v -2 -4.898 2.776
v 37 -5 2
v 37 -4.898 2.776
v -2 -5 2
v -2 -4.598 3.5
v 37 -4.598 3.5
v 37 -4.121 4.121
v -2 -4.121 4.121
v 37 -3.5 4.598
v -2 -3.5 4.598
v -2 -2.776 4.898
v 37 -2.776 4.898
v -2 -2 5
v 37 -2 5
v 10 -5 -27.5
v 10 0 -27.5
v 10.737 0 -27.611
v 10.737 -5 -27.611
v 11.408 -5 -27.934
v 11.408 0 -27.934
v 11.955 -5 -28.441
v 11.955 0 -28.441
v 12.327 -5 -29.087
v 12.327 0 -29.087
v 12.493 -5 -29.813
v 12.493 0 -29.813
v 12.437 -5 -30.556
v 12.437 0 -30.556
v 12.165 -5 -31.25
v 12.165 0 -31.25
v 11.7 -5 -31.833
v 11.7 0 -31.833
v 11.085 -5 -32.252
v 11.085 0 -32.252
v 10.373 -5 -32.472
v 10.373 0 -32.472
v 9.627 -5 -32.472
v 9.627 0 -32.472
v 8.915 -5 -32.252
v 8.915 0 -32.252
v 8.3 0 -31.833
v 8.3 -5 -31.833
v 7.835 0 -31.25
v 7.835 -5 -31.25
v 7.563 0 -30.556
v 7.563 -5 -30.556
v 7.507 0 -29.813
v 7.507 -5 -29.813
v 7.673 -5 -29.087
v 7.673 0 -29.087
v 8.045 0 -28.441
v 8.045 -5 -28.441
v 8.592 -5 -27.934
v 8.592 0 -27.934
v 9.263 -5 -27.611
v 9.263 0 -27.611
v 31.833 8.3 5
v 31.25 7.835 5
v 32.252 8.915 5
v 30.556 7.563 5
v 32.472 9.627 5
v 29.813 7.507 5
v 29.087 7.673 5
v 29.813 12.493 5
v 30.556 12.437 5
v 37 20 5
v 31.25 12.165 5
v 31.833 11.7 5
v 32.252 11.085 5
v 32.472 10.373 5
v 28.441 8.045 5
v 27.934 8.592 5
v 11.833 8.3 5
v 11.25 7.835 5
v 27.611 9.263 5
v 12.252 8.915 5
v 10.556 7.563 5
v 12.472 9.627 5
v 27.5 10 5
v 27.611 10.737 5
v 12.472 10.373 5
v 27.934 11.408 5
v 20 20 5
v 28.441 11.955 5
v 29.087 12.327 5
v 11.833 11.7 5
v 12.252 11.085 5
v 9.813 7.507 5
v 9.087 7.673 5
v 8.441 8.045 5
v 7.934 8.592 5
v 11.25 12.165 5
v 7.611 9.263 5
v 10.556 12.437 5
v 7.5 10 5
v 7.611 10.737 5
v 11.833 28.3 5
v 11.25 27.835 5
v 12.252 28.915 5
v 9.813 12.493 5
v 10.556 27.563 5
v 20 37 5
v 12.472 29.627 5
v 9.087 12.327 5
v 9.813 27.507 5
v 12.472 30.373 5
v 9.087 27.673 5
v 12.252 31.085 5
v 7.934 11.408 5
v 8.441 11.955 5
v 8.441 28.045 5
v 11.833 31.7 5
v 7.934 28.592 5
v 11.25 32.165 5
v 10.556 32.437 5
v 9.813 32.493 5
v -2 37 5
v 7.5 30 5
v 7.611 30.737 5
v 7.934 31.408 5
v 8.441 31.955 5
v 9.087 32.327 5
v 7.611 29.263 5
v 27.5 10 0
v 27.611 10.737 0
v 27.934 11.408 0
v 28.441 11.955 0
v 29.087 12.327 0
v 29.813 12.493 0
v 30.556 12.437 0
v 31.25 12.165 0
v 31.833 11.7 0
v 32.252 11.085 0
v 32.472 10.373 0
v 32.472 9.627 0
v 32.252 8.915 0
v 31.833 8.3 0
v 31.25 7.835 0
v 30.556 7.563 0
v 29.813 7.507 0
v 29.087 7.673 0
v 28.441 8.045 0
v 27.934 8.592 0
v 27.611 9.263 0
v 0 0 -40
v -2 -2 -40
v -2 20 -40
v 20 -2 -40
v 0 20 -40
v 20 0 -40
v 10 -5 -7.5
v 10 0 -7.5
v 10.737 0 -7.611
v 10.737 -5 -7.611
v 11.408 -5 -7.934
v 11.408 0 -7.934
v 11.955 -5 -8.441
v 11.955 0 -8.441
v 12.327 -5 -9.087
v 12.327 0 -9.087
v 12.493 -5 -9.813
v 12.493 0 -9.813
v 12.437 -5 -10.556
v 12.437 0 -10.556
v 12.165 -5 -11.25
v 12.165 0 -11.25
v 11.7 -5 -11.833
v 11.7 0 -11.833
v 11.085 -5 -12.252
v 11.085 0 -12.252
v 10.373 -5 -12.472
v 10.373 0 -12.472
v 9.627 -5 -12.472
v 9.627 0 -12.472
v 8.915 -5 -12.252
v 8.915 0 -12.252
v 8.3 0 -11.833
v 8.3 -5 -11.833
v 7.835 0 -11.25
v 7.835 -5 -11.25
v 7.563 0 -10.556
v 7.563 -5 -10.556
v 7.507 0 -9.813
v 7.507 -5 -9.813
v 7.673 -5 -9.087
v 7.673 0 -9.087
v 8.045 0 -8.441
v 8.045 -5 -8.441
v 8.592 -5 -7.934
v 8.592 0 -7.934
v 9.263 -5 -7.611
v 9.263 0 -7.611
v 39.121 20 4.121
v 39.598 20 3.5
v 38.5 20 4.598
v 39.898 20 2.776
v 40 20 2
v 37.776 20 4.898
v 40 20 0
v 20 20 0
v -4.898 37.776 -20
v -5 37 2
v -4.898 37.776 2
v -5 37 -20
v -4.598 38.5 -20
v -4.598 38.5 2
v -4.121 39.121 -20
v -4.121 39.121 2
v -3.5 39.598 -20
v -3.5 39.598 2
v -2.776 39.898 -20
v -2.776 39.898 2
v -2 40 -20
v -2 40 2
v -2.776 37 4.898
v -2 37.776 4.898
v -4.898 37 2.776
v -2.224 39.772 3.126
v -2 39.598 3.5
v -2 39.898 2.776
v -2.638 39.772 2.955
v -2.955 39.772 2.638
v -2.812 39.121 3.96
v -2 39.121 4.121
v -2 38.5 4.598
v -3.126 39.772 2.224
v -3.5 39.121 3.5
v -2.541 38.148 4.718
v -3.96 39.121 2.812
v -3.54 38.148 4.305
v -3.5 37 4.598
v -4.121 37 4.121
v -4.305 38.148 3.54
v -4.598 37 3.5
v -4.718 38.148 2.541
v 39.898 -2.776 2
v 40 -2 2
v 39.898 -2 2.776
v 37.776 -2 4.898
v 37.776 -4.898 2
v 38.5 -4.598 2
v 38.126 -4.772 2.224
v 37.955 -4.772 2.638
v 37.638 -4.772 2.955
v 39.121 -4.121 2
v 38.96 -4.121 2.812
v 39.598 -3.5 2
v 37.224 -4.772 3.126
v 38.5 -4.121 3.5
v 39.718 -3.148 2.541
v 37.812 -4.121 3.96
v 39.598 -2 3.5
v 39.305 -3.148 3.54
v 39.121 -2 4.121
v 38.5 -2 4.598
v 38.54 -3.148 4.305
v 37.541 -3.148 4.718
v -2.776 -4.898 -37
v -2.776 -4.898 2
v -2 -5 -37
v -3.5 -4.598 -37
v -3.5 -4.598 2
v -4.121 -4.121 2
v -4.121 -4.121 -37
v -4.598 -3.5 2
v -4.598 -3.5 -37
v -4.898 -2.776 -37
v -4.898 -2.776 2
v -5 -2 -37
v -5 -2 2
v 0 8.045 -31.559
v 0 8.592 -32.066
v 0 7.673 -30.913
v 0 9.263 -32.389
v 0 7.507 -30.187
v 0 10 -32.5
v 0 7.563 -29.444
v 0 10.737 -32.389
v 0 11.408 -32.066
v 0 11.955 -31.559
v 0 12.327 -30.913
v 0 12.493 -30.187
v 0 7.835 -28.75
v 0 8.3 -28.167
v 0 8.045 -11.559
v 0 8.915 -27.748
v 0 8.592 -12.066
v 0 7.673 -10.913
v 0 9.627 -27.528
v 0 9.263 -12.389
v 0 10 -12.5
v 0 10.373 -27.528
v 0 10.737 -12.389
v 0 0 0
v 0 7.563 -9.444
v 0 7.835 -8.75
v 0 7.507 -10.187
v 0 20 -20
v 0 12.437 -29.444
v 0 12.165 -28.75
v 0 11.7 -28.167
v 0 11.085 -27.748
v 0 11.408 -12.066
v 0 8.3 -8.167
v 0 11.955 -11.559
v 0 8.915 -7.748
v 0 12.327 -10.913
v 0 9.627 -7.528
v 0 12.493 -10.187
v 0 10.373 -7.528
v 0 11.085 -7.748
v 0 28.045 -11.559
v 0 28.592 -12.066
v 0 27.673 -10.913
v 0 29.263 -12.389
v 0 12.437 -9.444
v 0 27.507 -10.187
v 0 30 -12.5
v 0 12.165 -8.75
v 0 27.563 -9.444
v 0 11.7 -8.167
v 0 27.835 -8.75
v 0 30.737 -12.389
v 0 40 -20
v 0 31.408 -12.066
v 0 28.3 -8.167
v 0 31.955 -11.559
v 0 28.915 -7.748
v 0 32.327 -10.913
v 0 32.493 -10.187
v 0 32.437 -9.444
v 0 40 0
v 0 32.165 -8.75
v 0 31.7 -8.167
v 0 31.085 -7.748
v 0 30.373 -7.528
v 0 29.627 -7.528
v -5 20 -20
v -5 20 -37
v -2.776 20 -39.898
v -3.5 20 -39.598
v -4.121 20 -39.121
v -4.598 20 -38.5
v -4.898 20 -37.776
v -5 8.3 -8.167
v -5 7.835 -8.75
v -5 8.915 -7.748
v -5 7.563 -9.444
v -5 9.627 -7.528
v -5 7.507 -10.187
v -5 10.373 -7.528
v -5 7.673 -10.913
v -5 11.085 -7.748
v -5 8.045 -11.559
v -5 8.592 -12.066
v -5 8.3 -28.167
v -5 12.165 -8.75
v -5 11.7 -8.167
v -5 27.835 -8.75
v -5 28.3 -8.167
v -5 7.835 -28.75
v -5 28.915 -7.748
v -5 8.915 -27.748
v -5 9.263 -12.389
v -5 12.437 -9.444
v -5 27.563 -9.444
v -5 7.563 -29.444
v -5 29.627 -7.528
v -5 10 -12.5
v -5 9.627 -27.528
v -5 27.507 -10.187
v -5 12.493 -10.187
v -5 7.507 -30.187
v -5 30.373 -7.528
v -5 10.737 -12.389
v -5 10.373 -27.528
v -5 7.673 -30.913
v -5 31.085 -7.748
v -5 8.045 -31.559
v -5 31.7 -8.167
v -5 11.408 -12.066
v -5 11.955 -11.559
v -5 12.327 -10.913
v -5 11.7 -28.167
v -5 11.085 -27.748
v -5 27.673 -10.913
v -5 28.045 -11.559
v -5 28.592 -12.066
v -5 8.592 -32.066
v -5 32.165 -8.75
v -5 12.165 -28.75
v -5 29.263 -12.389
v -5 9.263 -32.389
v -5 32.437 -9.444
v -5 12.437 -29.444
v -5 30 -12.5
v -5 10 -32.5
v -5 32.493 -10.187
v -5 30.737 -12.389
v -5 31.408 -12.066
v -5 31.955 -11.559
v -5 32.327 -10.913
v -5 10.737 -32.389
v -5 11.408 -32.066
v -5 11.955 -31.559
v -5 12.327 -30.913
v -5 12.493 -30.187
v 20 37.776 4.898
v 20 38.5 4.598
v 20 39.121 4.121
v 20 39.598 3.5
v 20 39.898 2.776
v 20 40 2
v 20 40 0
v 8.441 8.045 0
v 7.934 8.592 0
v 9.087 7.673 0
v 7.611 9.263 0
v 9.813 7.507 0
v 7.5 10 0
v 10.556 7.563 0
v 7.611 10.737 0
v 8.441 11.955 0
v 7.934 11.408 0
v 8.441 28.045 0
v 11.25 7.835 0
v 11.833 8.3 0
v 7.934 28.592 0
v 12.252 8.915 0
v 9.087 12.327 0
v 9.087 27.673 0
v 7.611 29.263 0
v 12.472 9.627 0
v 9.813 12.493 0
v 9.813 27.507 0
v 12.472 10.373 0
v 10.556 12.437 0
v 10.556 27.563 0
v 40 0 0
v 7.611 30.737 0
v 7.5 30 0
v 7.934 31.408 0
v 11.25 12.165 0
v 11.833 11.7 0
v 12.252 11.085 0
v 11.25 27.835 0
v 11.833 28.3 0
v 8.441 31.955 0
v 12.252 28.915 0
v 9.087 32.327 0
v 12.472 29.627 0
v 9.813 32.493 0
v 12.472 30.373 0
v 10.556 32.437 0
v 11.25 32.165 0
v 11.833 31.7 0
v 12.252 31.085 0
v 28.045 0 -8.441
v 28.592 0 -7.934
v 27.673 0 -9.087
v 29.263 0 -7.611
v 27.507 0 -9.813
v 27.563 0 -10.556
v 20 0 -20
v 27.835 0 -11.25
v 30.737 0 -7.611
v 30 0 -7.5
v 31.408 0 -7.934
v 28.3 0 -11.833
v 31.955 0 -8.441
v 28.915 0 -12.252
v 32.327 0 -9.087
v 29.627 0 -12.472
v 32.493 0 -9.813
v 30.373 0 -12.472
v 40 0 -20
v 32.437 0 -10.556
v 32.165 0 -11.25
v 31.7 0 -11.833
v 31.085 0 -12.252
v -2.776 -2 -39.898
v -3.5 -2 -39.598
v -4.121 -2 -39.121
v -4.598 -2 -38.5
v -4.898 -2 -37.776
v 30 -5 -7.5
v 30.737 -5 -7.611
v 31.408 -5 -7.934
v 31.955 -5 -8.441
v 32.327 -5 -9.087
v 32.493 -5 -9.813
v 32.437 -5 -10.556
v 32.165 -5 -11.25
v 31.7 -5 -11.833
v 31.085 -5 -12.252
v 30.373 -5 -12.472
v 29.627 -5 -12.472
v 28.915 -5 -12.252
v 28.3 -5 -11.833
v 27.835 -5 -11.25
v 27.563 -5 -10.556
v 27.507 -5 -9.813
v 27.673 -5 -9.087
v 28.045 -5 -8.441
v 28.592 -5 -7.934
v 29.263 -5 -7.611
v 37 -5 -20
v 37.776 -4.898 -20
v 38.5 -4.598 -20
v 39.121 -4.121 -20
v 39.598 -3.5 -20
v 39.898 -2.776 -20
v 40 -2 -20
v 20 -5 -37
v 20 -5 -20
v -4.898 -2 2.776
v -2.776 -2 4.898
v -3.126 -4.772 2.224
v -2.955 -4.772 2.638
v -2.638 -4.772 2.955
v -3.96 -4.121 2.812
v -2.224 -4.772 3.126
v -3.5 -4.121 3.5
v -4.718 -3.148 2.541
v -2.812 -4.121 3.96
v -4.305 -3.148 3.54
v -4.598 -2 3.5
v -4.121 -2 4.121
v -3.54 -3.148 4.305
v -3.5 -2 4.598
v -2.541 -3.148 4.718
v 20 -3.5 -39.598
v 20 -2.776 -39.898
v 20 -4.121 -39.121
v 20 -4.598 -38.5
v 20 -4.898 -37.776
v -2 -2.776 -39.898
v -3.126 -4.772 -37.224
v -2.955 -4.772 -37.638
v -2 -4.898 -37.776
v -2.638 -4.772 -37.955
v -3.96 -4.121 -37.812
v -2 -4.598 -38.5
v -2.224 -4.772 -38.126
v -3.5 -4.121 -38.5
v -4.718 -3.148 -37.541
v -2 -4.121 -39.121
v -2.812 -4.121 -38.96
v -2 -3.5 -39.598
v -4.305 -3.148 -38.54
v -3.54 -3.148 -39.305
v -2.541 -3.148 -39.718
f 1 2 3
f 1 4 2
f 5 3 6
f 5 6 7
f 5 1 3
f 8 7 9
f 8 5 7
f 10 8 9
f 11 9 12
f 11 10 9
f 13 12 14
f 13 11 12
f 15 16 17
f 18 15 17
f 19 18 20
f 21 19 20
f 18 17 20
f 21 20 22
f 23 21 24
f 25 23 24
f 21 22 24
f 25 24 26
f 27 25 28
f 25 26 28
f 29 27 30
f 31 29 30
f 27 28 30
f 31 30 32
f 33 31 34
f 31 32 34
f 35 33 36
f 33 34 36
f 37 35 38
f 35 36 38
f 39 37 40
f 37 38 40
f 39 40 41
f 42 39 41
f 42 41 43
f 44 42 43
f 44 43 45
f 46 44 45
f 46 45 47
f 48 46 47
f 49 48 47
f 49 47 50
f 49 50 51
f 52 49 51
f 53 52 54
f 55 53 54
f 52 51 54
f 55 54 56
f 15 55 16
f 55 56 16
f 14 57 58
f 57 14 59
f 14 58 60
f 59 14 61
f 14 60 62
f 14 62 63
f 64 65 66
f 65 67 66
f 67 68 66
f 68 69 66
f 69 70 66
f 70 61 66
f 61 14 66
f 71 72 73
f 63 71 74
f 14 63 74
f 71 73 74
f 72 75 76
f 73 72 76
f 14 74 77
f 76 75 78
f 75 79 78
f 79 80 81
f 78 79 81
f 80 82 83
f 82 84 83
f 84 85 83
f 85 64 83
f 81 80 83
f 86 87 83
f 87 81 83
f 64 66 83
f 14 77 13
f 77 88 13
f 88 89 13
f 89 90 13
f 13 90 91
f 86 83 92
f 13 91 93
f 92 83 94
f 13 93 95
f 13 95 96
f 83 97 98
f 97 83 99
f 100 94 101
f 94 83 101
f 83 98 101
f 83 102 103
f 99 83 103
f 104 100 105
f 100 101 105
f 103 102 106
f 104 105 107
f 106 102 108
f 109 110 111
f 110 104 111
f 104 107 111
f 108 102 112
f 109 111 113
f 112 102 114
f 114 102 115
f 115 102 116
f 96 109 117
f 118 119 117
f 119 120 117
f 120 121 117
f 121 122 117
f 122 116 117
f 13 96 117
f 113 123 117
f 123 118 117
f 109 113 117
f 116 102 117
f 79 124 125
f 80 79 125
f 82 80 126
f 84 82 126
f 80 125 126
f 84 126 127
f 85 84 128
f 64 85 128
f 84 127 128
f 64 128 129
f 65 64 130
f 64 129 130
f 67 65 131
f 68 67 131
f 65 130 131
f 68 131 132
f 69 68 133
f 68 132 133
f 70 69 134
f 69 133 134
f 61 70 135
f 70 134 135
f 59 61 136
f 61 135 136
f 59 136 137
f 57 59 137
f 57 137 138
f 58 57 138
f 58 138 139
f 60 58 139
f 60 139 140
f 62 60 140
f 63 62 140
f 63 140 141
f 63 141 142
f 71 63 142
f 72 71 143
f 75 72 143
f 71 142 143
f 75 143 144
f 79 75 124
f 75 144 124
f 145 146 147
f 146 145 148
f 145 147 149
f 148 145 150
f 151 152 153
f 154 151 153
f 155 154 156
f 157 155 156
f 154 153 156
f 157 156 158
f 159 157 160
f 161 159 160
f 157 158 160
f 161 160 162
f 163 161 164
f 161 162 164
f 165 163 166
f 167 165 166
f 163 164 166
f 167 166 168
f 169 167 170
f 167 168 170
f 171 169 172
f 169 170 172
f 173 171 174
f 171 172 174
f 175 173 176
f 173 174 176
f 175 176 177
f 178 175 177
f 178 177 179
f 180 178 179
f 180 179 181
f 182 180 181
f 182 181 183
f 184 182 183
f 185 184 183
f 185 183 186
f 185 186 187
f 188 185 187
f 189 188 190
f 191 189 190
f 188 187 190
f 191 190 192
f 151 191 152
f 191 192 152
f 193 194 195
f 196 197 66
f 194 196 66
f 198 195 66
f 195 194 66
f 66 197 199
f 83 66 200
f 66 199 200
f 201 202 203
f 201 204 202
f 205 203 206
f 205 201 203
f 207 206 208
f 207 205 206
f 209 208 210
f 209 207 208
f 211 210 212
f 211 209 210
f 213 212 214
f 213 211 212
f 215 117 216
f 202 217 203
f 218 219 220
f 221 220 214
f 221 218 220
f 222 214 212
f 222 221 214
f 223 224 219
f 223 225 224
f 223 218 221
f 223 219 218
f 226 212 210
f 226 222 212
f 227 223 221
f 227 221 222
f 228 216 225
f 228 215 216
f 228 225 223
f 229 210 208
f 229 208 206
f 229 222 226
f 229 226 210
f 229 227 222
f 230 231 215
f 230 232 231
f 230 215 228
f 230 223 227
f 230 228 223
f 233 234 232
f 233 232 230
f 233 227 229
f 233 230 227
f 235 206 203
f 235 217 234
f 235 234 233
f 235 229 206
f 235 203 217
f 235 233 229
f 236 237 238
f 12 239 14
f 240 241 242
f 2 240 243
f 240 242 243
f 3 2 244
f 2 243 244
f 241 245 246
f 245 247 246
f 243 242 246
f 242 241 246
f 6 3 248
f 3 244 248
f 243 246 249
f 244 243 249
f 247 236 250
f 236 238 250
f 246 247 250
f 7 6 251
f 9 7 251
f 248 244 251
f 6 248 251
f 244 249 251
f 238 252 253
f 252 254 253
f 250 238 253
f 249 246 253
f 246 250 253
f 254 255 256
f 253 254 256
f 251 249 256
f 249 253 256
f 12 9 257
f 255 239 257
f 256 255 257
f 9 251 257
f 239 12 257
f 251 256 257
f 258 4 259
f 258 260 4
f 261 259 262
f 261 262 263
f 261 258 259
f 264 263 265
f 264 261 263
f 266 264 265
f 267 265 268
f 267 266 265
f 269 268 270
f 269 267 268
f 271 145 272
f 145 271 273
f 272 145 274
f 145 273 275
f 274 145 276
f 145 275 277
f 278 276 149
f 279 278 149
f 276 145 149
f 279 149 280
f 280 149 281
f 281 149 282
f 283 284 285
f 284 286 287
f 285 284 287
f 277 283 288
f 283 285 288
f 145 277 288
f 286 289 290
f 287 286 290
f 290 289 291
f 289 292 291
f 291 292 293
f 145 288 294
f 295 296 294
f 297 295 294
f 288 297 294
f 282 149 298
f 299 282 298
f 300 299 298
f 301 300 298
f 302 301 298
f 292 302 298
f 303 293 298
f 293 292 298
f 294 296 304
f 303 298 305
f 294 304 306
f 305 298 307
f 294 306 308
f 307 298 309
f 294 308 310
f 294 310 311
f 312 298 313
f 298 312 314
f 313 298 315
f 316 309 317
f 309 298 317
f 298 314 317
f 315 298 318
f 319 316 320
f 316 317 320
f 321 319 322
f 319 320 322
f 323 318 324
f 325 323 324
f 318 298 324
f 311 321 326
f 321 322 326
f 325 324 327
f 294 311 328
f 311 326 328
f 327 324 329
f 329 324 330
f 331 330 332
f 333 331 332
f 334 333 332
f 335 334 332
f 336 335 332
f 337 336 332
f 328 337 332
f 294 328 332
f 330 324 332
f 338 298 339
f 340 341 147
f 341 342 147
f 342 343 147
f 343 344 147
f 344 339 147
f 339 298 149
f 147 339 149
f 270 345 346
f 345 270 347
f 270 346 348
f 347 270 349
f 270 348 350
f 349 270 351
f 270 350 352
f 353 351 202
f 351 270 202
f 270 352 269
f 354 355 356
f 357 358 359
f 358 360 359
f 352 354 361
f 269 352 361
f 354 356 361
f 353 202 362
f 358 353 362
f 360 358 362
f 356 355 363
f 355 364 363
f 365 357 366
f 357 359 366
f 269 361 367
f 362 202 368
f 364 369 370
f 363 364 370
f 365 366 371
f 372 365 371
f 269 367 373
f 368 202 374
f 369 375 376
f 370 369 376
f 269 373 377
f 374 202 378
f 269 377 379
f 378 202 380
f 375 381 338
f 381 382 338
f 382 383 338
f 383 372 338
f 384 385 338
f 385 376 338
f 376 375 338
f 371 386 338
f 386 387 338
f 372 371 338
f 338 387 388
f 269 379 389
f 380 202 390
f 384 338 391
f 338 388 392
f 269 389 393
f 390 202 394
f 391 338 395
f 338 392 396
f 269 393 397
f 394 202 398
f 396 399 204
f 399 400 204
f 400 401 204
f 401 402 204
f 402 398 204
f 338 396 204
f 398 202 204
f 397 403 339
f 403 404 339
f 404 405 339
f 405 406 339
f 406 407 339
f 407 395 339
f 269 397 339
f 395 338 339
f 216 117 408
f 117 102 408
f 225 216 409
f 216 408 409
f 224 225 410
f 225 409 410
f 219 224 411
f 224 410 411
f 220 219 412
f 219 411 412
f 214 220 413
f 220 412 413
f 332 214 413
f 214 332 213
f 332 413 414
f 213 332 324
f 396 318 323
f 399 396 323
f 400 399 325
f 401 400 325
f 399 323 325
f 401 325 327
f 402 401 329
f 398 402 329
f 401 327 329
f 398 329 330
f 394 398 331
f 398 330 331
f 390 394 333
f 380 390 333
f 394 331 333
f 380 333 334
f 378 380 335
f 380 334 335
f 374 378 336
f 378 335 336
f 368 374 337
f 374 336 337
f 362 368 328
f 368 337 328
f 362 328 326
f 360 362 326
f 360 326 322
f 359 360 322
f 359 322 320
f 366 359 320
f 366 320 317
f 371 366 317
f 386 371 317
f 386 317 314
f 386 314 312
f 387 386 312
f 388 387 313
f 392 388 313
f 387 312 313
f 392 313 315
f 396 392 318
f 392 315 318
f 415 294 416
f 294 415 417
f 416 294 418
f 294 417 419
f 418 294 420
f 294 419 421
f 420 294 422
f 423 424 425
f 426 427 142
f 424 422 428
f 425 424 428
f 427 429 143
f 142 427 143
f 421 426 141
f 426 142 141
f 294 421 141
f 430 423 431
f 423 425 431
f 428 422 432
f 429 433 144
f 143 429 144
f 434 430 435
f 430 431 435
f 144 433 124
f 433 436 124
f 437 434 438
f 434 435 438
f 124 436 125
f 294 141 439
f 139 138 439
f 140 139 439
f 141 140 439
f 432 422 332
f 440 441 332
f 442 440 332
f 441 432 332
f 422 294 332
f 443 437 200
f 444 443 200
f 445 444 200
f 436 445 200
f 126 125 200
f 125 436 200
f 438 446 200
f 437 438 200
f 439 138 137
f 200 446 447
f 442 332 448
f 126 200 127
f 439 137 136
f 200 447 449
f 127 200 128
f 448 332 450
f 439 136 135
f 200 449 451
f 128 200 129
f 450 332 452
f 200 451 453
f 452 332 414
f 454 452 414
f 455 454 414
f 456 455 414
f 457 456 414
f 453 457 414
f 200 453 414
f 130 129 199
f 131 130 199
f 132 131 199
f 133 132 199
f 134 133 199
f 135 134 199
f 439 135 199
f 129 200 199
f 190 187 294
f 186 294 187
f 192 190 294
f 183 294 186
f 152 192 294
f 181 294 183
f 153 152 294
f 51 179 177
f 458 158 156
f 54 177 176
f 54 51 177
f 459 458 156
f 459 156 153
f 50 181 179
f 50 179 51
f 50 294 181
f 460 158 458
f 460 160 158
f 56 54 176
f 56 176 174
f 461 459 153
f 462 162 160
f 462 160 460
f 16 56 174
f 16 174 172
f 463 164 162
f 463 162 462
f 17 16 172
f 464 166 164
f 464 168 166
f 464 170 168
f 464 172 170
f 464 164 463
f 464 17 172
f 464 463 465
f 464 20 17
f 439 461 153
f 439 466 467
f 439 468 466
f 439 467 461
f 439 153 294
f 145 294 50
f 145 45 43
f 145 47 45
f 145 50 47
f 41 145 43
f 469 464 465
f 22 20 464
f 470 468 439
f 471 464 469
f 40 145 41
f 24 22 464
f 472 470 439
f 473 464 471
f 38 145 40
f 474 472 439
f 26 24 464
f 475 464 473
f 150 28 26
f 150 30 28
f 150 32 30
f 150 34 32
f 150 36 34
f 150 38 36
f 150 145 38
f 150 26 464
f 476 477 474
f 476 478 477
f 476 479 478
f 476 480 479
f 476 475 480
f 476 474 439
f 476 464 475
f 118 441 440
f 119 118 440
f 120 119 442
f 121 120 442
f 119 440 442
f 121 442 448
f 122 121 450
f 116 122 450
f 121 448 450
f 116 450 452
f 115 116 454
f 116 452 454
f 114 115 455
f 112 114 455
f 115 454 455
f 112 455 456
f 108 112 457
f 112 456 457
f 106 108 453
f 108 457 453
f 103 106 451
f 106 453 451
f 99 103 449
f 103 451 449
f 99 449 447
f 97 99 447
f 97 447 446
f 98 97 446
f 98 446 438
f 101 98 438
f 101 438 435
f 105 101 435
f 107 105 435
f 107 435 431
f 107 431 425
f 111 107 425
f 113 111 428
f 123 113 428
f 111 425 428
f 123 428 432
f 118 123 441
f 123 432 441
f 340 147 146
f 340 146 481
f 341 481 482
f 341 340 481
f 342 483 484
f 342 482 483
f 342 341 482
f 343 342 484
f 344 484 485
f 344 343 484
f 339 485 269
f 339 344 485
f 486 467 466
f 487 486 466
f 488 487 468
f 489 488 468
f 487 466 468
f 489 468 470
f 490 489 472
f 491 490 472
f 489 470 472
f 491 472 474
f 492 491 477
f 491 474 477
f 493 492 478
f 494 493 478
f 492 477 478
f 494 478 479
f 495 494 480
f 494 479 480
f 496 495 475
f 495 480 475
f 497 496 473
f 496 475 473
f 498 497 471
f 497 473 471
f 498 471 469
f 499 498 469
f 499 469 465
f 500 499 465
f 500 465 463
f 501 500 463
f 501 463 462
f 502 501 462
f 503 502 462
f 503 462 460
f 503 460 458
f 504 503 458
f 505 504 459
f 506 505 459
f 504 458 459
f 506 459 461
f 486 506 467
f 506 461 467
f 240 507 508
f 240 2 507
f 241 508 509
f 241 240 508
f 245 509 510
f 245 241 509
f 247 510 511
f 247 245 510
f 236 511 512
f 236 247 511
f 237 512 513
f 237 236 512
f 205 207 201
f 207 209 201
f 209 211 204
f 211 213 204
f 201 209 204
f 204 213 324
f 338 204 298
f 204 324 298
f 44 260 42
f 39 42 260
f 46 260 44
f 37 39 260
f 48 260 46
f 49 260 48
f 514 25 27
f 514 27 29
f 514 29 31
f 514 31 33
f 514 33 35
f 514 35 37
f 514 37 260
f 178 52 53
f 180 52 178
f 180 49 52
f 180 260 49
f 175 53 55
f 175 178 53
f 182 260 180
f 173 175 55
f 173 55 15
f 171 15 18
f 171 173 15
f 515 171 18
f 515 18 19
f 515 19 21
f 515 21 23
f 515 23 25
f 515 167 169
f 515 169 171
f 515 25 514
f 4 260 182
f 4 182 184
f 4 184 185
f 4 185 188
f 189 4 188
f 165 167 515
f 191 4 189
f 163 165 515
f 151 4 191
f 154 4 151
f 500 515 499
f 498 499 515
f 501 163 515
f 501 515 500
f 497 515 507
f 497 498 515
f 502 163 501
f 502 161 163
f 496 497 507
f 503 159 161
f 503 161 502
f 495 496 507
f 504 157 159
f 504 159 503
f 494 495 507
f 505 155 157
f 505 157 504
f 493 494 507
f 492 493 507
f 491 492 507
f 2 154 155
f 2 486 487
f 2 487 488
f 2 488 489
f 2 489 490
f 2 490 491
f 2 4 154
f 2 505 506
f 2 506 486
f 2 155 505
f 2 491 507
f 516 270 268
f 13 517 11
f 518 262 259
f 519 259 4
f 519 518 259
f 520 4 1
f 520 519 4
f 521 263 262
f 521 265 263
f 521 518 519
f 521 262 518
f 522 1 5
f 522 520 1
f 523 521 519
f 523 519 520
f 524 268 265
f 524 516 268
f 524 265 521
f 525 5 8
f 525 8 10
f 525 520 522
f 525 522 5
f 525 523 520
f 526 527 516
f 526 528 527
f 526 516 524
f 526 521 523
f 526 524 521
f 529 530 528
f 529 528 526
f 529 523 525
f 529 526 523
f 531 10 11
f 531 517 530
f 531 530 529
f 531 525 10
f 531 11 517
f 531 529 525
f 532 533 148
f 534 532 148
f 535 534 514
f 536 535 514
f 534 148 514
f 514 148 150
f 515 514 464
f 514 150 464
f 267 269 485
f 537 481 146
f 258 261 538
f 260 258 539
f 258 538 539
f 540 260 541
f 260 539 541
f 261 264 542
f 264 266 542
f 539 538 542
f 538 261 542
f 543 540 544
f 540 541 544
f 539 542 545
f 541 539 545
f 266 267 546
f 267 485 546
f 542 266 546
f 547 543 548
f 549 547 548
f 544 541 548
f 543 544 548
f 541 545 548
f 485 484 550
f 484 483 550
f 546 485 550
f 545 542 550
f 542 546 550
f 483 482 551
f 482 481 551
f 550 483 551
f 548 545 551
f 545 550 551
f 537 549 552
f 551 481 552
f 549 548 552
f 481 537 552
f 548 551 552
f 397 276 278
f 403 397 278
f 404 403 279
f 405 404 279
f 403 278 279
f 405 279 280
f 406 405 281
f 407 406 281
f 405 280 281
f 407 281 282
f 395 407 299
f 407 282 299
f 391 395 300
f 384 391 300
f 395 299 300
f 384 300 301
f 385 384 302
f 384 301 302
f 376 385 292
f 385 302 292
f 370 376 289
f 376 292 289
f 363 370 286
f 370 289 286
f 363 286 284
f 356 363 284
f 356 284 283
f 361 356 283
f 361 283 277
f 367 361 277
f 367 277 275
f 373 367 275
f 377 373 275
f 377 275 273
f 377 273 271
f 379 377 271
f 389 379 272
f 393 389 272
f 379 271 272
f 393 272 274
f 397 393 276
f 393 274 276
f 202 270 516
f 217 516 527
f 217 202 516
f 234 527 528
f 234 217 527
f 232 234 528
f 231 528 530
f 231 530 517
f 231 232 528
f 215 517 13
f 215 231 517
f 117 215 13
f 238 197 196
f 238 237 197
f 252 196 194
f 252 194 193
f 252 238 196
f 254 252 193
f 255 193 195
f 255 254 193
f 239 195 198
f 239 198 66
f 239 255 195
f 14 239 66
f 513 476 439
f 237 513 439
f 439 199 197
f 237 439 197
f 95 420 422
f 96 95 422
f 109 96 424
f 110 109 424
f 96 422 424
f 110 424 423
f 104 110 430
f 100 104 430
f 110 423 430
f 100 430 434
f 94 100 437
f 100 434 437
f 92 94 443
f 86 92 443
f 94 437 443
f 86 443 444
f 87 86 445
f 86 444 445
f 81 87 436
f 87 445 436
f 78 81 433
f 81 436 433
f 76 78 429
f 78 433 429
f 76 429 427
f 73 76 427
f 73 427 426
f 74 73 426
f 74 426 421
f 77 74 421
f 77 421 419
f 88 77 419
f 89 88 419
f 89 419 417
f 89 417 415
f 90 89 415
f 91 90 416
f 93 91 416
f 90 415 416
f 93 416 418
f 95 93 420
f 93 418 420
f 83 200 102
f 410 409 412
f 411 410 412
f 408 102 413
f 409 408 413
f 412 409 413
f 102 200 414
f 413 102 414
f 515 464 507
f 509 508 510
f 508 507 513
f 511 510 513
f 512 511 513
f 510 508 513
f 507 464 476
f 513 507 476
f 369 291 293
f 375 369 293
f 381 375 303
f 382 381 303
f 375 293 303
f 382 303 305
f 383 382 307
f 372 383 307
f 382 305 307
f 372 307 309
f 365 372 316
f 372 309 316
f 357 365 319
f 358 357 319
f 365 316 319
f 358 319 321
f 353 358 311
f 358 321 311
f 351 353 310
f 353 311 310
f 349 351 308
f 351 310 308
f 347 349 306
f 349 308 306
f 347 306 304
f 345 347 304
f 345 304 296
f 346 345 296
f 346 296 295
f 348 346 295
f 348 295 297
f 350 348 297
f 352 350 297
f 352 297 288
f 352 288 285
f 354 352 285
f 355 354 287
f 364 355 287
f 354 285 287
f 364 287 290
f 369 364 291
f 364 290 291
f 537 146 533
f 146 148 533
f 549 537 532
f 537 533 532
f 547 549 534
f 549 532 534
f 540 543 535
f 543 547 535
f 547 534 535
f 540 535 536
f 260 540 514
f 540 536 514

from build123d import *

# Parameters (mm, degrees)
SKETCH_1_W          = 20
SKETCH_1_H          = 20
EXTRUDE_1_DEPTH     = 20
EXTRUDE_1_2_DEPTH   = 20
SKETCH_1_3_W        = 20
SKETCH_1_3_H        = 20
EXTRUDE_2_DEPTH     = 40
EXTRUDE_3_DEPTH     = 5
EXTRUDE_4_DEPTH     = 5
EXTRUDE_5_DEPTH     = 5
CUT_EXTRUDE_1_DEPTH = 40
SKETCH_7_R          = 2.5
CUT_EXTRUDE_2_DEPTH = 5
SKETCH_9_R          = 2.5
CUT_EXTRUDE_3_DEPTH = 5
SKETCH_10_R         = 2.5
CUT_EXTRUDE_4_DEPTH = 5
FILLET_1_R          = 3


with BuildPart() as part:
    # 스케치1 → 보스-돌출1 (new body)
    with BuildSketch(Plane(origin=(0, 0, 0), x_dir=(1, 0, 0), z_dir=(0, 1, 0))):
        with Locations((30, 10)):
            Rectangle(SKETCH_1_W, SKETCH_1_H)
    extrude(amount=EXTRUDE_1_DEPTH)



with BuildPart() as body_2:
    # 스케치1 → Extrude 1 2 (new body)
    with BuildSketch(Plane(origin=(0, 0, 0), x_dir=(1, 0, 0), z_dir=(0, 1, 0))):
        with Locations((10, 30)):
            Rectangle(SKETCH_1_W, SKETCH_1_H)
    extrude(amount=EXTRUDE_1_2_DEPTH)


with BuildPart() as part_1:
    add(part.part)

    add(body_2.part)  # 보스-돌출2 merges body 2
    # 스케치1<3> → 보스-돌출2 (add)
    with BuildSketch(Plane(origin=(0, 0, 0), x_dir=(1, 0, 0), z_dir=(0, 1, 0))):
        with Locations((10, 10)):
            Rectangle(SKETCH_1_3_W, SKETCH_1_3_H)
    extrude(amount=EXTRUDE_2_DEPTH)



with BuildPart() as body_2_2:
    # 스케치2 → 보스-돌출3 (new body)
    with BuildSketch(Plane.XY):
        Polygon((0, 0), (40, 0), (40, 20), (20, 20), (20, 40), (0, 40), align=None)
    extrude(amount=EXTRUDE_3_DEPTH)


with BuildPart() as body_3:
    # 스케치3 → 보스-돌출4 (new body)
    with BuildSketch(Plane.ZY):
        Polygon((5, 40), (-20, 40), (-20, 20), (-40, 20), (-40, 0), (5, 0), align=None)
    extrude(amount=EXTRUDE_4_DEPTH)


with BuildPart() as part_2:
    add(part_1.part)

    add(body_2_2.part)  # 보스-돌출5 merges body 2 2

    add(body_3.part)  # 보스-돌출5 merges body 3
    # 스케치5 → 보스-돌출5 (add)
    with BuildSketch(Plane.XZ):
        Polygon((40, 5), (-5, 5), (-5, -40), (20, -40), (20, -20), (40, -20), align=None)
    extrude(amount=EXTRUDE_5_DEPTH)

    # 스케치6 → 컷-돌출1 (cut)
    with BuildSketch(Plane(origin=(0, 40, 0), x_dir=(1, 0, 0), z_dir=(0, 1, 0))):
        Polygon((0, 0), (40, 0), (40, 20), (20, 20), (20, 40), (0, 40), align=None)
    extrude(amount=-CUT_EXTRUDE_1_DEPTH, mode=Mode.SUBTRACT)

    # 스케치7 → 컷-돌출2 (cut)
    with BuildSketch(Plane(origin=(0, 0, 0), x_dir=(1, 0, 0), z_dir=(0, 1, 0))):
        with Locations((10, 30)):
            Circle(SKETCH_7_R)
        with Locations((30, 10)):
            Circle(SKETCH_7_R)
        with Locations((10, 10)):
            Circle(SKETCH_7_R)
    extrude(amount=-CUT_EXTRUDE_2_DEPTH, mode=Mode.SUBTRACT)

    # 스케치9 → 컷-돌출3 (cut)
    with BuildSketch(Plane(origin=(0, 0, 0), x_dir=(-1, 0, 0), z_dir=(0, 0, -1))):
        with Locations((-10, 30)):
            Circle(SKETCH_9_R)
        with Locations((-30, 10)):
            Circle(SKETCH_9_R)
        with Locations((-10, 10)):
            Circle(SKETCH_9_R)
    extrude(amount=-CUT_EXTRUDE_3_DEPTH, mode=Mode.SUBTRACT)

    # 스케치10 → 컷-돌출4 (cut)
    with BuildSketch(Plane(origin=(0, 0, 0), x_dir=(0, 0, -1), z_dir=(1, 0, 0))):
        with Locations((10, 30)):
            Circle(SKETCH_10_R)
        with Locations((30, 10)):
            Circle(SKETCH_10_R)
        with Locations((10, 10)):
            Circle(SKETCH_10_R)
    extrude(amount=-CUT_EXTRUDE_4_DEPTH, mode=Mode.SUBTRACT)

    # 필렛1
    fillet_1_edges = [part_2.edges().sort_by_distance(p)[0] for p in [
        (-5, 7.5, -40),
        (7.5, -5, -40),
        (40, -5, -7.5),
        (40, 7.5, 5),
        (17.5, -5, 5),
        (-5, -5, -17.5),
        (-5, 17.5, 5),
        (-5, 40, -7.5),
        (7.5, 40, 5),
    ]]
    fillet(fillet_1_edges, radius=FILLET_1_R)


solid = part_2.part
